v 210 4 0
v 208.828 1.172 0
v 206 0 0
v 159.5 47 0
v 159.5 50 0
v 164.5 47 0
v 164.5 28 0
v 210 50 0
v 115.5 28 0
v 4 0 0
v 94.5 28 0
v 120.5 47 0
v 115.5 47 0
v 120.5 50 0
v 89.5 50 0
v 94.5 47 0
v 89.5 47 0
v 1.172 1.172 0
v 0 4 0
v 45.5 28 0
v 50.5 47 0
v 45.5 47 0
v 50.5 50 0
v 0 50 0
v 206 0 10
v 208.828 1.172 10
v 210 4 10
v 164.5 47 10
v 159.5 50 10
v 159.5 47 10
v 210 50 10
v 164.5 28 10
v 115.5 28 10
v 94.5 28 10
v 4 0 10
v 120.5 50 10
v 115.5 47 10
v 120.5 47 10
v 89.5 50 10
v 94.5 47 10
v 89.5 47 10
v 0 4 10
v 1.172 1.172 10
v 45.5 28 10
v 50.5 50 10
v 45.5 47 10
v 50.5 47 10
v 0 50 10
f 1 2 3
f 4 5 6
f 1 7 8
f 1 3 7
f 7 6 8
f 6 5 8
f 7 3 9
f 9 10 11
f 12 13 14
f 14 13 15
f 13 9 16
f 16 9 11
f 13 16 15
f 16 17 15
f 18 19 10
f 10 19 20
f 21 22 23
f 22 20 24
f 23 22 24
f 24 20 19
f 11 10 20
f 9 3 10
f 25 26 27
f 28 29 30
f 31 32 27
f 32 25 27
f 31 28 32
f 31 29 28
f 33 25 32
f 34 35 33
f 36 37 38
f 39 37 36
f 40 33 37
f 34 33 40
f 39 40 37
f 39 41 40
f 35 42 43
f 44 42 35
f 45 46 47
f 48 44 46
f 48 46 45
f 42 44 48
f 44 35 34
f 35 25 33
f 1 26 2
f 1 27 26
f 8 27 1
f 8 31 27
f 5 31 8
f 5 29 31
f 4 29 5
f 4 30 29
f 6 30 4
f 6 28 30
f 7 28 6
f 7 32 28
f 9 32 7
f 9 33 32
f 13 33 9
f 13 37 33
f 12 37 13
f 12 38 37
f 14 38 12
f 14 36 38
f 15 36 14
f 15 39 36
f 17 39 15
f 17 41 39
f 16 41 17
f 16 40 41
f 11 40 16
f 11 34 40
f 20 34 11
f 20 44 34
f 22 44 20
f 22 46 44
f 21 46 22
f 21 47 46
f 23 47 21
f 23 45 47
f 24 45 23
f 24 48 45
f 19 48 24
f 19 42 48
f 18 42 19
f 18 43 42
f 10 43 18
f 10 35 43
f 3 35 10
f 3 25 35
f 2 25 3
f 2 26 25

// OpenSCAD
$fn = 32;

// ----------------------------------------------------------------------
// Oversize slot bar: 210 mm bar with 2 oversize windows
// ----------------------------------------------------------------------

// --- parameters (mm) ---
profile_height = 10;      // extrusion height
profile_points = 24;      // points of the closed outline

profile = [[0, 4], [1.172, 1.172], [4, 0], [206, 0], [208.828, 1.172], [210, 4], [210, 50], [159.5, 50], [159.5, 47], [164.5, 47], [164.5, 28], [115.5, 28], [115.5, 47], [120.5, 47], [120.5, 50], [89.5, 50], [89.5, 47], [94.5, 47], [94.5, 28], [45.5, 28], [45.5, 47], [50.5, 47], [50.5, 50], [0, 50]];  // single closed polygon, 24 points, counter clockwise

// --- the one profile operation ---
linear_extrude(height = profile_height) polygon(points = profile);
